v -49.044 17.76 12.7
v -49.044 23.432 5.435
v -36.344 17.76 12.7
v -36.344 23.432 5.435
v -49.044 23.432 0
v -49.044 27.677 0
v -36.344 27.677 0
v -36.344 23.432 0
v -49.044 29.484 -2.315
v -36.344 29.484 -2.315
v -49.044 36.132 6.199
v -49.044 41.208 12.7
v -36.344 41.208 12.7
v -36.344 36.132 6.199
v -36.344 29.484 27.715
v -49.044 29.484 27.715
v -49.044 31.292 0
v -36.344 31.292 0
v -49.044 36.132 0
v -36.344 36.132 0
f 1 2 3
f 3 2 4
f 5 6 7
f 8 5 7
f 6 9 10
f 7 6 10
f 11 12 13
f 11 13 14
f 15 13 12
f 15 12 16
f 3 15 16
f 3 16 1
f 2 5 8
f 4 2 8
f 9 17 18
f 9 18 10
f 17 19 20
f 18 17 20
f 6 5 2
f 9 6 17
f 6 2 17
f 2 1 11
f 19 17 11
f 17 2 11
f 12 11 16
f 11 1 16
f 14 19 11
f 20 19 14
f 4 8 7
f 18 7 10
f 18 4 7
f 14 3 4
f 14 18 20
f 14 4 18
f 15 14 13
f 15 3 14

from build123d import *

# Parameters (mm, degrees)
F0_W      = 12.7
F0_H      = 12.7
F1_DEPTH  = 12.7
F3_DEPTH  = 12.7
F3_FACE_W = 12.7
F3_FACE_H = 19.05


with BuildPart() as f1:
    # F0 (on Top) → F1 (new body)
    with BuildSketch(Plane.XY):
        with Locations((-42.6943581551, 29.7822718922)):
            Rectangle(F0_W, F0_H)
    extrude(amount=F1_DEPTH)

    # F2 (on face) → F3 (join)
    with BuildSketch(Plane.YZ.offset(-36.3443581551)):
        Polygon((17.7597312508, 12.7), (23.4322718922, 12.7), (36.1322718922, 12.7), (41.2083510732, 12.7), (29.484041162, 27.714761307), align=None)
    extrude(amount=-F3_DEPTH)

    # F4: sweep along a path in F4_path
    with BuildLine(Plane(origin=(-49.0443581551, 29.484041162, 27.714761307), x_dir=(0, -0.6154493392, 0.7881764466), z_dir=(0, -0.7881764466, -0.6154493392))) as f4_path:
        Line((0, 0), (-19.05, 0))
    # F3_face (on face) → F4 (sweep)
    with BuildSketch(Plane(origin=(-42.6943581551, 23.6218862064, 20.2073806535), x_dir=(1, 0, 0), z_dir=(0, -0.7881764466, 0.6154493392))):
        Rectangle(F3_FACE_W, F3_FACE_H)
    sweep(path=f4_path.line)


solid = f1.part
